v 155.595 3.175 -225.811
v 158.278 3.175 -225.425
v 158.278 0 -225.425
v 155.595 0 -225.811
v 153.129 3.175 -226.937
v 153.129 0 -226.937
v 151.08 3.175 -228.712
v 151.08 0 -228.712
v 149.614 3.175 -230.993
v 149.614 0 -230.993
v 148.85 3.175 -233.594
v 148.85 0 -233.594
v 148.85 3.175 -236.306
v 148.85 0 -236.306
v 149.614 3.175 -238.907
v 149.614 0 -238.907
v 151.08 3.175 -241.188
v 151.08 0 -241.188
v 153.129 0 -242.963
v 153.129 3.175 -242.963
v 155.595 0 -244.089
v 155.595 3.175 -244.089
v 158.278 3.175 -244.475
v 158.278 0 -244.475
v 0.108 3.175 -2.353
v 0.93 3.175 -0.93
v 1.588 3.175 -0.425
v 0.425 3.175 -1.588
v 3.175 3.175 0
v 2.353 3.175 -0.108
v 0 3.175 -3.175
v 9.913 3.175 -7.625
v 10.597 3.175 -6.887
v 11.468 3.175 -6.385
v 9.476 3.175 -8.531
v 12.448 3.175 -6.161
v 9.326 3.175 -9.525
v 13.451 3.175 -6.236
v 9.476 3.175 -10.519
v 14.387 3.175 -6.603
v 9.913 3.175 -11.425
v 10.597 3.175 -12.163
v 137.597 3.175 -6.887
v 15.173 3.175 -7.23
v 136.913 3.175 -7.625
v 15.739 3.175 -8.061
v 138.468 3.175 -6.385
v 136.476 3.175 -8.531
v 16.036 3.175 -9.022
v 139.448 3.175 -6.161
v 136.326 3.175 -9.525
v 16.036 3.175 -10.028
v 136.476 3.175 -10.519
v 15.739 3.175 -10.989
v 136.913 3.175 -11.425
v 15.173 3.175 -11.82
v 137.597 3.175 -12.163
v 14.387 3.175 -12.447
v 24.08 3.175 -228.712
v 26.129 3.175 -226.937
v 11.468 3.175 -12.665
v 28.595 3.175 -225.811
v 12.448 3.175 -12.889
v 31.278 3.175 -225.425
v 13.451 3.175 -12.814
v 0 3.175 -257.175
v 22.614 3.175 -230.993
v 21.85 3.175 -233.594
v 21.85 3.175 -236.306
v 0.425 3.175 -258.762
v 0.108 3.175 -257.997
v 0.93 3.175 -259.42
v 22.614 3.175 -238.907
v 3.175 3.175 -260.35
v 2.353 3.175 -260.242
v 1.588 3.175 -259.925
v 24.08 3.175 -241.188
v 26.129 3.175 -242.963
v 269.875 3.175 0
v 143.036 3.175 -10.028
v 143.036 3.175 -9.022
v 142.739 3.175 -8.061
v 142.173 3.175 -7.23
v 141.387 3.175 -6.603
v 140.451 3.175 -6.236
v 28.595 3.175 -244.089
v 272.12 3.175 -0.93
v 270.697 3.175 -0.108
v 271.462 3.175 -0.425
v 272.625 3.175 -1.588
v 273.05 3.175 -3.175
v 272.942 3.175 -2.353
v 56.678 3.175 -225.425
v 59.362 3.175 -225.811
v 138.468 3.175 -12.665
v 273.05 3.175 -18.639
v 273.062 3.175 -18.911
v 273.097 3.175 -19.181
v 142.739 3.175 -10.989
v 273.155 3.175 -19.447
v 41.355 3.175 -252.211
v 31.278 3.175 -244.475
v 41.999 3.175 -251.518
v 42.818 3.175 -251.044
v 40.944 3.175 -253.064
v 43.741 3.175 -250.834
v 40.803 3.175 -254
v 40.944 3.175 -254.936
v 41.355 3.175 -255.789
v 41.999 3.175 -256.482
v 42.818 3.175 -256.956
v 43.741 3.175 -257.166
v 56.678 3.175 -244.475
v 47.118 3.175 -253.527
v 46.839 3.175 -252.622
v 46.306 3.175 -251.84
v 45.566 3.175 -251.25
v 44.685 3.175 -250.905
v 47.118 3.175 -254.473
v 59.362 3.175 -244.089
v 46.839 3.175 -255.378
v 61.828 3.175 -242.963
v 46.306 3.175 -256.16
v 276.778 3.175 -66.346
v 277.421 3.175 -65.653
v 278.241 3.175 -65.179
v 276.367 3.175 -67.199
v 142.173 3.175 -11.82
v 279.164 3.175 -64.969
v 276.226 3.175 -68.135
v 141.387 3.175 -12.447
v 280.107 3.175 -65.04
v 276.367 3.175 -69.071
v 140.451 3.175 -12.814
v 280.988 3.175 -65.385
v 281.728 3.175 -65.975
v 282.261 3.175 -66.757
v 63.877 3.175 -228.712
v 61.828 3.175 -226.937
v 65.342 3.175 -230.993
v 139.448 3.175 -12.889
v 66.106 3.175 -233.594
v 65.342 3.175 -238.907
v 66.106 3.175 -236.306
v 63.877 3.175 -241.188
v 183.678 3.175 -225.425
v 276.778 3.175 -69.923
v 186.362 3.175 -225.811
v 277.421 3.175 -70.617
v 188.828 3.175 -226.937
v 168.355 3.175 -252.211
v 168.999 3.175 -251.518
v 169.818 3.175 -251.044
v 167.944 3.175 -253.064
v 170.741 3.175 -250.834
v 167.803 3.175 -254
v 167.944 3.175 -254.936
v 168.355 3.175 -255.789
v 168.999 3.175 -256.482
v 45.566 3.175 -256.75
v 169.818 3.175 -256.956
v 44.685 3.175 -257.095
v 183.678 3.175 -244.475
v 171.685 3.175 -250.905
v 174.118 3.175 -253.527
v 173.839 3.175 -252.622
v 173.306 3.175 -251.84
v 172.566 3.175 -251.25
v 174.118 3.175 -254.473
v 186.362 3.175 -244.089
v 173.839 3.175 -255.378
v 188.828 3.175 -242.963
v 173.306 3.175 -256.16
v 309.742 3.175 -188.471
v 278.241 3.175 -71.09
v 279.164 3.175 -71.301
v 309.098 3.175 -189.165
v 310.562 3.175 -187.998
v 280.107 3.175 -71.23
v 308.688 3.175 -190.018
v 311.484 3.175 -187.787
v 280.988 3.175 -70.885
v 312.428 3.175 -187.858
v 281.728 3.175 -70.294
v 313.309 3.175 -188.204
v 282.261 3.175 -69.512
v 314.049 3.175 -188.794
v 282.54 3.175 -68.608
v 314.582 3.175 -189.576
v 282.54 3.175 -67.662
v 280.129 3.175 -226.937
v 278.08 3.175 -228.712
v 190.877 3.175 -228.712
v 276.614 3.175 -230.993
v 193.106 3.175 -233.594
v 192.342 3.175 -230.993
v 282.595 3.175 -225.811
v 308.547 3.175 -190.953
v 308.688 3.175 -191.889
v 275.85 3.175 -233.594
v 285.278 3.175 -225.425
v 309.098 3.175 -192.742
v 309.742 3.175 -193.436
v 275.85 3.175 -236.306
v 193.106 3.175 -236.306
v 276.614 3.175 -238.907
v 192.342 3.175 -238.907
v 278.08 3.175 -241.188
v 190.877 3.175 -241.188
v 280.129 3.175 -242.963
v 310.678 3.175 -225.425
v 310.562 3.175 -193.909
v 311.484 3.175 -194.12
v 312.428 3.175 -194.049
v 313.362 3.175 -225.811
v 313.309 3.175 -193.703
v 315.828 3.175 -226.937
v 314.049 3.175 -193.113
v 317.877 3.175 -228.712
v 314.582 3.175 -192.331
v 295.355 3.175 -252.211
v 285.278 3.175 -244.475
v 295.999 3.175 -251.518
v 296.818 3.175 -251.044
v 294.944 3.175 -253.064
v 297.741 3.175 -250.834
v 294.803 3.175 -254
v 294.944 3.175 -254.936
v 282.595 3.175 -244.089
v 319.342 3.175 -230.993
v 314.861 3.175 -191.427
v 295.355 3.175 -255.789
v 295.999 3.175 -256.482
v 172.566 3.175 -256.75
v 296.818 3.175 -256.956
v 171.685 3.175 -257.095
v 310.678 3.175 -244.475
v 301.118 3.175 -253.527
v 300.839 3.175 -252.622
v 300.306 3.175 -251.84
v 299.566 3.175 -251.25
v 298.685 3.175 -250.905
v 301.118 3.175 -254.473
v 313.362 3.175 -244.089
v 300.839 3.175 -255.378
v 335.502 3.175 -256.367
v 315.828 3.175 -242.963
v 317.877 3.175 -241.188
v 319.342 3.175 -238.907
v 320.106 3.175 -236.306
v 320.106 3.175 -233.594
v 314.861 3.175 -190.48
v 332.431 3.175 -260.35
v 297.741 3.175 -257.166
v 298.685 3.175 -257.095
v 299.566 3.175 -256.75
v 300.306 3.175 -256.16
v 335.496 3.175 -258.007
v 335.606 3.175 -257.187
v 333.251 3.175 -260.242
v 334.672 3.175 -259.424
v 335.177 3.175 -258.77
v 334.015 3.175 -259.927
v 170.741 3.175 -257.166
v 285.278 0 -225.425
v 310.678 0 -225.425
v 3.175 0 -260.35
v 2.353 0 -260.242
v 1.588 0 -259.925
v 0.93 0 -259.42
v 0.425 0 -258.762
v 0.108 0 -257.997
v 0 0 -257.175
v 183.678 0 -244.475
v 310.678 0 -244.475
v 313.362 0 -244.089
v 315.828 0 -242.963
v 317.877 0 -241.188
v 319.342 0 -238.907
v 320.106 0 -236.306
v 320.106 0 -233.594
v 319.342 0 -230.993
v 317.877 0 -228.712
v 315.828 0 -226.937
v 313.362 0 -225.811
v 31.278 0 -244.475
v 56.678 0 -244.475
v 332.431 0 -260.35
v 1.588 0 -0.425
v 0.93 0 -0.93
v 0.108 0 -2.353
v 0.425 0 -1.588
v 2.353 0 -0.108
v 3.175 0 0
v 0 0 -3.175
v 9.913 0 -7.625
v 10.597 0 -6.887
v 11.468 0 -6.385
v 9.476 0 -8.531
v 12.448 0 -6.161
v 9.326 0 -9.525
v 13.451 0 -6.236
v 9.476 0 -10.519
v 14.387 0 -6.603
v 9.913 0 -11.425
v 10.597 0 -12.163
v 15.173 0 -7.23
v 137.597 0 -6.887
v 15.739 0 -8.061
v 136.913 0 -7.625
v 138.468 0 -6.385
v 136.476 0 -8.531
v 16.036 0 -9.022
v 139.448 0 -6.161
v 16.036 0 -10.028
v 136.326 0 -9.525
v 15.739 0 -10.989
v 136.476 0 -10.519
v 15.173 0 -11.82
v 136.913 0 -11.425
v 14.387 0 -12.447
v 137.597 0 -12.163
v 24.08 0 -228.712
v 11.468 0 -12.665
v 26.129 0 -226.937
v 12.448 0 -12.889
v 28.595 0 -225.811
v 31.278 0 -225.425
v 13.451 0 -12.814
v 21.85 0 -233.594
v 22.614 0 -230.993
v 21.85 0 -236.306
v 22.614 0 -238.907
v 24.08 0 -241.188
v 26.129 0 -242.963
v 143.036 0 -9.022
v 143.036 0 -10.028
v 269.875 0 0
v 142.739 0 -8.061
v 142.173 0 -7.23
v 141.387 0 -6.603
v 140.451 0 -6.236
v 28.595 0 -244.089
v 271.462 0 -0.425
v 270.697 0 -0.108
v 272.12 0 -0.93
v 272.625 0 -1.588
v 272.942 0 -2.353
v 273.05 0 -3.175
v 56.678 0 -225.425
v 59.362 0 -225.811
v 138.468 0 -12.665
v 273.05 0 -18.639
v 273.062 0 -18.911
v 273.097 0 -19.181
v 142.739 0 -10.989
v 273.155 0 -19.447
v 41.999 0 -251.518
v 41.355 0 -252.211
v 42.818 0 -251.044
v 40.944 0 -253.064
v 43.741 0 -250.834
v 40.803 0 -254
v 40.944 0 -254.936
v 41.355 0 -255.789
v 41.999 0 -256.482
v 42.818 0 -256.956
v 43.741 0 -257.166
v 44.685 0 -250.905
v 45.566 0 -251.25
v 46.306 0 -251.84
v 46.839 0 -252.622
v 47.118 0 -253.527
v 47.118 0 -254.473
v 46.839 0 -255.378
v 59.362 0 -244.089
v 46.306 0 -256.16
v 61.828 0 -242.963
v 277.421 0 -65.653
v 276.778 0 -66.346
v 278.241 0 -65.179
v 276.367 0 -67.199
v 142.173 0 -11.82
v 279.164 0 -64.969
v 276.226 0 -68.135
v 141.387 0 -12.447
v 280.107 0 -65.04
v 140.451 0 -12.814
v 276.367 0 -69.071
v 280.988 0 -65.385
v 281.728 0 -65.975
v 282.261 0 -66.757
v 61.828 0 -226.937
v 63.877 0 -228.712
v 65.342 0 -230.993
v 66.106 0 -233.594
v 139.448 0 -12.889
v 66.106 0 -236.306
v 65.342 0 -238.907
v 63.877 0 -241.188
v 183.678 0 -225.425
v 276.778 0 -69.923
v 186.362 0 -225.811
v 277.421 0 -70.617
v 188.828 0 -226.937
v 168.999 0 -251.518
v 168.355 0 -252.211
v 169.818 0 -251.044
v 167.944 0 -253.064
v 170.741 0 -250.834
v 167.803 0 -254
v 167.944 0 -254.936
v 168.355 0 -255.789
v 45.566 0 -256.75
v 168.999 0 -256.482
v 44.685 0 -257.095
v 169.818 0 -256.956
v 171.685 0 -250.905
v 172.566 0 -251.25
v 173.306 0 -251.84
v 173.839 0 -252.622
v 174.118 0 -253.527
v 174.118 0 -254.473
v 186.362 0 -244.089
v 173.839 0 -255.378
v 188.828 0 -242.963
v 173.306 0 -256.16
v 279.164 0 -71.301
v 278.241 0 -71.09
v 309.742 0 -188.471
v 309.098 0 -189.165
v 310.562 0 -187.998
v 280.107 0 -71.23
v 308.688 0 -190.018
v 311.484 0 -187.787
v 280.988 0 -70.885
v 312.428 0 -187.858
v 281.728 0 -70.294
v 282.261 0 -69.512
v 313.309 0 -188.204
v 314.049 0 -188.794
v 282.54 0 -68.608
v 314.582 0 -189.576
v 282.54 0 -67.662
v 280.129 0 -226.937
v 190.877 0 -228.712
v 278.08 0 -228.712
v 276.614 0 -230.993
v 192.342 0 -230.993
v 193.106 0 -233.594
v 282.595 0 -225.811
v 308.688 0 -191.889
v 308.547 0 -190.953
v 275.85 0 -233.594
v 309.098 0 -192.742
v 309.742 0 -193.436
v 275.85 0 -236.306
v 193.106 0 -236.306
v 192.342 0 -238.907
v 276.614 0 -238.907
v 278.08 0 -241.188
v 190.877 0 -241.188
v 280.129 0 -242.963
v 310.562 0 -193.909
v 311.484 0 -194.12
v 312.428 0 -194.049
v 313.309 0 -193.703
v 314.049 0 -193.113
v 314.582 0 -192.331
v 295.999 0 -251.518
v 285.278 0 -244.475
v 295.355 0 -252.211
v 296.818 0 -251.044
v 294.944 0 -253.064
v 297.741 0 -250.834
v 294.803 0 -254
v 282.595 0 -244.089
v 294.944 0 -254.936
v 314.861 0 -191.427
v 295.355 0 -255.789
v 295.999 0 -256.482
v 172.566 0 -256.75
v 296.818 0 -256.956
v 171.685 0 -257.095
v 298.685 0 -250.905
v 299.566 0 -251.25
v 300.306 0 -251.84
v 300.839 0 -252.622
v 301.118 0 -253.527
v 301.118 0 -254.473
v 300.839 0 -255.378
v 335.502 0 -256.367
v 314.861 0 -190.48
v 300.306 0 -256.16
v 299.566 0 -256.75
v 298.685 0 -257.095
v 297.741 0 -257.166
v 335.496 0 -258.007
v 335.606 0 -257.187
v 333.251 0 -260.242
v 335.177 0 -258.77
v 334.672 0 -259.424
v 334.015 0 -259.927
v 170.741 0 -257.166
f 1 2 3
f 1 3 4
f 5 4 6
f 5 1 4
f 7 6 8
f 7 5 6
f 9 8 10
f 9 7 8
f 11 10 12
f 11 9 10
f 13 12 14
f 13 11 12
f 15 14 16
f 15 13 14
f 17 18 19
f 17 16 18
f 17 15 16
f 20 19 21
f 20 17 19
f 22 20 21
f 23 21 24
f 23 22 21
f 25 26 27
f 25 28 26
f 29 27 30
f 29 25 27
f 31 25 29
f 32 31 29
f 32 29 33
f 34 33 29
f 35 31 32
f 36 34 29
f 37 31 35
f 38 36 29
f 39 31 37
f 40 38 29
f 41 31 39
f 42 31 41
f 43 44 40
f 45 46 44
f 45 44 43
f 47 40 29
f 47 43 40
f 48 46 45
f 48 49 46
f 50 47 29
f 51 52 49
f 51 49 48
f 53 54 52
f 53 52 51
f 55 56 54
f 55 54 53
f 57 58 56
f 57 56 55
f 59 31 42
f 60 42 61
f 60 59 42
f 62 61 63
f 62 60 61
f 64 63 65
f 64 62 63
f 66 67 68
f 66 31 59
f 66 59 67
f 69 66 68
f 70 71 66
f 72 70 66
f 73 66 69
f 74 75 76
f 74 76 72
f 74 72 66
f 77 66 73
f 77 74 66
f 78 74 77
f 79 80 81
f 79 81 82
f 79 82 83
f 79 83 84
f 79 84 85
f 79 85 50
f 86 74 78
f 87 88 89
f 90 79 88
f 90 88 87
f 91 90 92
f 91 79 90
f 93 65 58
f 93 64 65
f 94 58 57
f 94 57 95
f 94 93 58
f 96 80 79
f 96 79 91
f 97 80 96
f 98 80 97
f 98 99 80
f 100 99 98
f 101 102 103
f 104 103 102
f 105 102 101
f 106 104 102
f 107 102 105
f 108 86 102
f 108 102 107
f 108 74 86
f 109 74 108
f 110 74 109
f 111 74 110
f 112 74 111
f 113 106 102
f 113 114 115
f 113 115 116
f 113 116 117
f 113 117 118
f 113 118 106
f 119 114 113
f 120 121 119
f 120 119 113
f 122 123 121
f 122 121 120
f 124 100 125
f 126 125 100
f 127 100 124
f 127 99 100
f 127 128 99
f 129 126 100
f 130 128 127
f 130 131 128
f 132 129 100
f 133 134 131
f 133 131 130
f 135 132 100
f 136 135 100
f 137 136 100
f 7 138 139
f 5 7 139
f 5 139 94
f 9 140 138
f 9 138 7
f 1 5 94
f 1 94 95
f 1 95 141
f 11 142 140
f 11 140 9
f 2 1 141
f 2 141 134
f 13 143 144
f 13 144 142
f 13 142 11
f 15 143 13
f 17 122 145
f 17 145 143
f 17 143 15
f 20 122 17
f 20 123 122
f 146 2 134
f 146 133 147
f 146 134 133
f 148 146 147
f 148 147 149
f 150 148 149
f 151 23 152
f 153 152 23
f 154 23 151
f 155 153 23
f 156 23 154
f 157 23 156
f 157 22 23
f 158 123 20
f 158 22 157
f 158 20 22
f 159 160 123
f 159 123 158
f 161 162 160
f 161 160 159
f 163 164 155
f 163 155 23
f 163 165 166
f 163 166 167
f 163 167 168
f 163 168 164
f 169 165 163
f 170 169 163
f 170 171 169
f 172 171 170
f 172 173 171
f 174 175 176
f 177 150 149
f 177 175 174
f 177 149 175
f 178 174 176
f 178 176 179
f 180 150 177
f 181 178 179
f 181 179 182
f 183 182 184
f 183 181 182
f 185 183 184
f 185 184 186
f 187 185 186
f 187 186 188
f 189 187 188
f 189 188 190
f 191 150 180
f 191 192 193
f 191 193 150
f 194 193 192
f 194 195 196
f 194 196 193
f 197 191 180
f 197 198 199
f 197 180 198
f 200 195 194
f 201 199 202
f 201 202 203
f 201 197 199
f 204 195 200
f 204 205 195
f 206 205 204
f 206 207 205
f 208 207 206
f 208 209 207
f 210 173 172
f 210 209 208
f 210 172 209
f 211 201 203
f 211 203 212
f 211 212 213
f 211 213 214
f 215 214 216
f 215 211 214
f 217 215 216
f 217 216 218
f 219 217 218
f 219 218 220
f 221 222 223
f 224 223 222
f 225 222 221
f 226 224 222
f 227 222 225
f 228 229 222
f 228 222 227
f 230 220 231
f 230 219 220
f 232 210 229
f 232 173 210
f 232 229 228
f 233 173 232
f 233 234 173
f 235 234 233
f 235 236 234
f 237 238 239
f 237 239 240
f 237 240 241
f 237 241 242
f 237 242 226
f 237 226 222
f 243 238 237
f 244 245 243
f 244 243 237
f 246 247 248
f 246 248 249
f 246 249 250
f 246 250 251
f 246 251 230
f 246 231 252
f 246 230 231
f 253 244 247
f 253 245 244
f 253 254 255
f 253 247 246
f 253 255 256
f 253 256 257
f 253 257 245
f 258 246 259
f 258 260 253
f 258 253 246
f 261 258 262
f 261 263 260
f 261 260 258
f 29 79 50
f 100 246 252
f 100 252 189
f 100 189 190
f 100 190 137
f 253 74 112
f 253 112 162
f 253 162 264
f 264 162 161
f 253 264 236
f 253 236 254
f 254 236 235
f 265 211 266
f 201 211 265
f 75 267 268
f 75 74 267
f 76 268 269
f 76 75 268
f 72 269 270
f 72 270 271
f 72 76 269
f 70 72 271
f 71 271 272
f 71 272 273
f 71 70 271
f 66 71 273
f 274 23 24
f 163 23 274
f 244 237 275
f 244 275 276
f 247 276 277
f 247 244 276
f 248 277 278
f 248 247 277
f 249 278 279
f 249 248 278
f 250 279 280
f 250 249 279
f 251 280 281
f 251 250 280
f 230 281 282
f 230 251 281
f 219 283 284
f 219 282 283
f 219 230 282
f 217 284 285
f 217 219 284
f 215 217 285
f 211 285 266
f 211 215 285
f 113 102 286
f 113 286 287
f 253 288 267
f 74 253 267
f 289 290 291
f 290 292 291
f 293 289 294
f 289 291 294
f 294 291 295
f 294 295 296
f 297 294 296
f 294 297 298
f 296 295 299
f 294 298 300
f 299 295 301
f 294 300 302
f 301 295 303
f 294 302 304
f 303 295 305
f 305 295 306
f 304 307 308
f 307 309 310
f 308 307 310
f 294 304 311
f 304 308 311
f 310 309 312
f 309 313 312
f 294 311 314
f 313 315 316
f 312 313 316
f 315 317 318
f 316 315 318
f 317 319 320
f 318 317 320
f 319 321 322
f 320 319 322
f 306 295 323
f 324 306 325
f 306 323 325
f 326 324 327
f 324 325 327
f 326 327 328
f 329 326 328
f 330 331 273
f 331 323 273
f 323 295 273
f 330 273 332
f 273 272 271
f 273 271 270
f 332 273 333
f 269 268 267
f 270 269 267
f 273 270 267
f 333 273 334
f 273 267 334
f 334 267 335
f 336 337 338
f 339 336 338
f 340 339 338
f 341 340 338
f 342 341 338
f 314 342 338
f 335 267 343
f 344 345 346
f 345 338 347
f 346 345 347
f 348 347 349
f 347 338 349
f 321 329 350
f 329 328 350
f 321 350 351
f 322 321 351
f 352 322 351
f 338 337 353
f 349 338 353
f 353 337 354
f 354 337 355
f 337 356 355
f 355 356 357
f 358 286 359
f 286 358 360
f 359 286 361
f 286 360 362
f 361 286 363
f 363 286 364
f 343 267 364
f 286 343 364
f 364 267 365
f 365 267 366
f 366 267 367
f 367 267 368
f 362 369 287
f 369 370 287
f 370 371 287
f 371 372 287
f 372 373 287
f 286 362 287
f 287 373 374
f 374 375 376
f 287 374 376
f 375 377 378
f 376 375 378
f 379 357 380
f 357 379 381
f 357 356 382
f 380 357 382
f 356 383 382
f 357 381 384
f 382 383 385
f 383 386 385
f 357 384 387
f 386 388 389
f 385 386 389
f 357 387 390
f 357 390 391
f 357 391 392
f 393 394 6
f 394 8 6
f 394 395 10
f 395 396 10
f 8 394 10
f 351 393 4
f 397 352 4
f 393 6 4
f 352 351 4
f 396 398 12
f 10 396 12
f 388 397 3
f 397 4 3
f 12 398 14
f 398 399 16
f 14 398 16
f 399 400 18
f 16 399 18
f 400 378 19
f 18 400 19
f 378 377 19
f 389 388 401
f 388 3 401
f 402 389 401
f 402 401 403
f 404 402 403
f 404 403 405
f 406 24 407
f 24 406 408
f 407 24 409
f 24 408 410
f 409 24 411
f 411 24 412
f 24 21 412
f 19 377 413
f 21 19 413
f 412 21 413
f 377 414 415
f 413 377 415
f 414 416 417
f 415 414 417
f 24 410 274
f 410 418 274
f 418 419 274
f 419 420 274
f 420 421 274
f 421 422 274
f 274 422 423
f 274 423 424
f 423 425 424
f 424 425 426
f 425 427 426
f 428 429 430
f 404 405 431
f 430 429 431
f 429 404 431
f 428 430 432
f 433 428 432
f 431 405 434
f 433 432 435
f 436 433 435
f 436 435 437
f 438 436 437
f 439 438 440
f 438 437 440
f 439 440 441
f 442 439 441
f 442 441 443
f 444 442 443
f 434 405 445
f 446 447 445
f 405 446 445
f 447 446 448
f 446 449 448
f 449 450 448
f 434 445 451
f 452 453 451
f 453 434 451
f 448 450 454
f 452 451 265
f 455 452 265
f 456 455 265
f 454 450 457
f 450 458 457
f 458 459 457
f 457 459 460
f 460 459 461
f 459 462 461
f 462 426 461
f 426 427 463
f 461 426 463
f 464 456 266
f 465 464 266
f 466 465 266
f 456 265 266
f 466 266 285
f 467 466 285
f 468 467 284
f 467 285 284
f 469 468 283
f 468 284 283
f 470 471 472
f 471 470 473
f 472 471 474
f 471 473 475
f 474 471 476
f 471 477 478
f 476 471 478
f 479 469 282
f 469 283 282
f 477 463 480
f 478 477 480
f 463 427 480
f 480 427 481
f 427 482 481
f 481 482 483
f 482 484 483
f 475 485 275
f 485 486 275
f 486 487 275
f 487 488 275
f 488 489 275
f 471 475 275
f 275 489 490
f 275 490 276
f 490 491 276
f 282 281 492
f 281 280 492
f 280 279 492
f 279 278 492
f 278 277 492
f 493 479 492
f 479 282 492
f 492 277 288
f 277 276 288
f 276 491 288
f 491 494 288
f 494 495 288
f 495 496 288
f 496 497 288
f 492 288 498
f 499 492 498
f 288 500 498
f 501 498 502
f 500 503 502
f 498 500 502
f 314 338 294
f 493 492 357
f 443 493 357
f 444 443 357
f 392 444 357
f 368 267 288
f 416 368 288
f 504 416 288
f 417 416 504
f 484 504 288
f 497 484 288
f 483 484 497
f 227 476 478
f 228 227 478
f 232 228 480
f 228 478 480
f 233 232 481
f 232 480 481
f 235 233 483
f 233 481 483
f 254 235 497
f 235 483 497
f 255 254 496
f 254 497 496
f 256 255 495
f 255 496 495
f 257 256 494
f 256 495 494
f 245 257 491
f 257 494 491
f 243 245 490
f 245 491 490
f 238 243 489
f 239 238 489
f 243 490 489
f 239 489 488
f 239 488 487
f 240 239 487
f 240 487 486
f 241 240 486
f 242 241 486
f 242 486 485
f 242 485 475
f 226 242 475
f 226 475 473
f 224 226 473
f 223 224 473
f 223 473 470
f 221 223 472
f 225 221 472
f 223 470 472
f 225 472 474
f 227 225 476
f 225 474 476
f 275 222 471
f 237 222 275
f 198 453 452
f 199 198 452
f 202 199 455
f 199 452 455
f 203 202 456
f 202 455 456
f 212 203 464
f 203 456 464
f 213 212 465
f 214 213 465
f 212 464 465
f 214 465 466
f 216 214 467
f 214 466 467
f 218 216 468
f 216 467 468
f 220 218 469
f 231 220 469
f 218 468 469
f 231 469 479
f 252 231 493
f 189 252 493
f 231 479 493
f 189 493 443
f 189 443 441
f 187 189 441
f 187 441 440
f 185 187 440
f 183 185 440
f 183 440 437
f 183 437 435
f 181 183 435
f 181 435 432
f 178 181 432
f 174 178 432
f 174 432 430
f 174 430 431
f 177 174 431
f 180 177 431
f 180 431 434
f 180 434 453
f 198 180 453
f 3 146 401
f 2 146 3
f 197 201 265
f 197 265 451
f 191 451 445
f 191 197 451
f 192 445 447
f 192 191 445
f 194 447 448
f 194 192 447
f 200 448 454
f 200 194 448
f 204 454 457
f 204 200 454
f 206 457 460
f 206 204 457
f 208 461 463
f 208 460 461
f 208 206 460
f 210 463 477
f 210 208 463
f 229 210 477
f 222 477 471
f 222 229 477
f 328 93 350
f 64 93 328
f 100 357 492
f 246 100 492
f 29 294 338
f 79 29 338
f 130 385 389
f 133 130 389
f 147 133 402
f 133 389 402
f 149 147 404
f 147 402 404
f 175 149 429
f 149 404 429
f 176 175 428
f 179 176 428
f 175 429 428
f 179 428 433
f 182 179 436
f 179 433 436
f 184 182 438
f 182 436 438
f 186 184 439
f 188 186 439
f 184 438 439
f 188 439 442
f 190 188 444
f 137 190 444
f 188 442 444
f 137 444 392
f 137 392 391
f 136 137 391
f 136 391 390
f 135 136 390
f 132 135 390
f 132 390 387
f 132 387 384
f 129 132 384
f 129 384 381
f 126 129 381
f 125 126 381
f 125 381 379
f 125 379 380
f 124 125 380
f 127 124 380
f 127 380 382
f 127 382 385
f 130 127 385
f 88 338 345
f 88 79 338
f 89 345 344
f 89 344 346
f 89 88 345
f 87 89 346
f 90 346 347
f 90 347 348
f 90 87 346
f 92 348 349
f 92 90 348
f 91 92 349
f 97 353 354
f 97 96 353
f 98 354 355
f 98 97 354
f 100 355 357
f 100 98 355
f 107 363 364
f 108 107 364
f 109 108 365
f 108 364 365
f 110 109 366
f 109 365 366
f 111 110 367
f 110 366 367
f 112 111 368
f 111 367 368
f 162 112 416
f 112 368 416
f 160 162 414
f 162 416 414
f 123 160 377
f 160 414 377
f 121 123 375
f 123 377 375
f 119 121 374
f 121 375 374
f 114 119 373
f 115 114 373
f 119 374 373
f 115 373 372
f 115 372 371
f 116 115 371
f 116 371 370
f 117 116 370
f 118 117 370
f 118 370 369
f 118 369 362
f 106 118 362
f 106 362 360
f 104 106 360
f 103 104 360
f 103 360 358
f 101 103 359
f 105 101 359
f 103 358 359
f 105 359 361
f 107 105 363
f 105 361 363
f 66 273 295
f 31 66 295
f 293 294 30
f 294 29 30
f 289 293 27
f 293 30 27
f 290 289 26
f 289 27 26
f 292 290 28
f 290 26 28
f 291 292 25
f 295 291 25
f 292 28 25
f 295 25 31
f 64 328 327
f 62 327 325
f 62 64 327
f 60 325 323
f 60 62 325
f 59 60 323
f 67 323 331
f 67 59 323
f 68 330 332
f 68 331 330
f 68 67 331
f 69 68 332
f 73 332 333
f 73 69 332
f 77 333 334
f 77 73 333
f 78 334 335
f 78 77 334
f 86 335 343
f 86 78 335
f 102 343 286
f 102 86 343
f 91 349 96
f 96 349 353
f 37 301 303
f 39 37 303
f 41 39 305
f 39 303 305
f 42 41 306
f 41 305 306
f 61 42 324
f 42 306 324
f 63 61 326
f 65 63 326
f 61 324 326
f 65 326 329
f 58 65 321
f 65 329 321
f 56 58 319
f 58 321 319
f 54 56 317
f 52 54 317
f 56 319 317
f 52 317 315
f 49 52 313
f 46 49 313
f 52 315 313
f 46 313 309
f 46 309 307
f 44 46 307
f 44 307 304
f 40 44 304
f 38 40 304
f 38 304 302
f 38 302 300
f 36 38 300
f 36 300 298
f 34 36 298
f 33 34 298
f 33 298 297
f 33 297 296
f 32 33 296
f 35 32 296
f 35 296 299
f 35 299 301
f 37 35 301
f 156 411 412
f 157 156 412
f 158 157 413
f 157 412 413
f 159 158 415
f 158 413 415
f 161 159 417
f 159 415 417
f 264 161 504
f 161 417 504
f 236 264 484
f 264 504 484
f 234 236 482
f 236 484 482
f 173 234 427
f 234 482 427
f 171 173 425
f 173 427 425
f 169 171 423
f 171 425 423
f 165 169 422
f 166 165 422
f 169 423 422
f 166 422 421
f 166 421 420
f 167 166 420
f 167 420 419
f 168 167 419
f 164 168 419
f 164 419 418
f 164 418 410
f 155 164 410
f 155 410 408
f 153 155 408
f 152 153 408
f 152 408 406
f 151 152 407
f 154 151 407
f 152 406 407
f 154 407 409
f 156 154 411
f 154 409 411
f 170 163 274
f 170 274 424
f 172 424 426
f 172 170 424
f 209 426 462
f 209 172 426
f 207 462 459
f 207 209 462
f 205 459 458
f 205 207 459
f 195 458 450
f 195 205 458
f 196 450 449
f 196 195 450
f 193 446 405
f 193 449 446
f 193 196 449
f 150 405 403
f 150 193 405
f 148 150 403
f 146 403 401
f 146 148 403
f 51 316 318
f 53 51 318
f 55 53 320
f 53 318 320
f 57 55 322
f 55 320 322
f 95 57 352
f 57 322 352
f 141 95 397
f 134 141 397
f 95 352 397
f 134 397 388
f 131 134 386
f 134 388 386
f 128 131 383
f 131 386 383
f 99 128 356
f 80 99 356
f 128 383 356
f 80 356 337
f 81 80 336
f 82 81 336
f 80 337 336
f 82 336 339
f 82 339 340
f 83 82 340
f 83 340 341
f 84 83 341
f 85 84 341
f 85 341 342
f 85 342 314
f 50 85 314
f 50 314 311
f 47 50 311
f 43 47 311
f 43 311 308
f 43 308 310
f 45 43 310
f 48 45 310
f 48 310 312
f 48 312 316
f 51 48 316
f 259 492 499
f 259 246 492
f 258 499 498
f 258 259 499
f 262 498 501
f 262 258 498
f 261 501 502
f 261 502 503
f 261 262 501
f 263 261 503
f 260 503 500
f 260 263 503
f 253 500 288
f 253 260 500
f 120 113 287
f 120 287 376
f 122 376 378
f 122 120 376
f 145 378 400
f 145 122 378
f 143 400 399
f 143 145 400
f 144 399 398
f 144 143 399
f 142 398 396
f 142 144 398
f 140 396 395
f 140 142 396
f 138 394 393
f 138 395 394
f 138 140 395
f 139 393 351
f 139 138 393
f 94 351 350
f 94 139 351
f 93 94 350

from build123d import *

# Parameters (mm, degrees)
BOSS_EXTRUDE1_DEPTH              = 3.175
FILLET1_R                        = 3.175
F_1_4_0_25_DIAMETER_HOLE1_D      = 6.35
F_17_64_0_26563_DIAMETER_HOLE1_D = 6.747002
SKETCH9_R                        = 3.175
CUT_EXTRUDE1_DEPTH               = 425.763278612


with BuildPart() as part:
    # Sketch1 → Boss-Extrude1 (new body)
    with BuildSketch(Plane(origin=(0, 0, 0), x_dir=(1, 0, 0), z_dir=(0, 1, 0))):
        Polygon((0, 0), (273.05, 0), (273.05, 19.05), (336.55, 260.35), (0, 260.35), align=None)
    extrude(amount=BOSS_EXTRUDE1_DEPTH)

    # Fillet1
    fillet1_edges = [part.edges().sort_by_distance(p)[0] for p in [
        (0, 1.5875, -260.35),
        (336.55, 1.5875, -260.35),
        (273.05, 1.5875, -19.05),
        (273.05, 1.5875, 0),
        (0, 1.5875, 0),
    ]]
    fillet(fillet1_edges, radius=FILLET1_R)

    # 1/4 (0.25) Diameter Hole1 (through all)
    with Locations(Plane(origin=(0, 3.175, 0), x_dir=(1, 0, 0), z_dir=(0, 1, 0))):
        with Locations((43.97818809, 254), (170.97818809, 254), (297.97818809, 254), (311.721536551, 190.953379927), (279.400887542, 68.134913694)):
            Hole(F_1_4_0_25_DIAMETER_HOLE1_D / 2)

    # 17/64 (0.26563) Diameter Hole1 (through all)
    with Locations(Plane(origin=(0, 3.175, 0), x_dir=(1, 0, 0), z_dir=(0, 1, 0))):
        with Locations((12.7, 9.525), (139.7, 9.525)):
            Hole(F_17_64_0_26563_DIAMETER_HOLE1_D / 2)

    # Sketch9 → Cut-Extrude1 (cut, through all)
    with BuildSketch(Plane(origin=(0, 3.175, 0), x_dir=(1, 0, 0), z_dir=(0, 1, 0))):
        with Locations(Location((297.97818809, 254, 0), (0, 0, 270))):
            Circle(SKETCH9_R)
        with Locations(Location((170.97818809, 254, 0), (0, 0, 270))):
            Circle(SKETCH9_R)
        with Locations(Location((43.97818809, 254, 0), (0, 0, 270))):
            Circle(SKETCH9_R)
        with BuildLine():
            Line((31.27818809, 244.475), (56.67818809, 244.475))
            ThreePointArc((56.67818809, 244.475), (66.20318809, 234.95), (56.67818809, 225.425))
            Line((56.67818809, 225.425), (31.27818809, 225.425))
            ThreePointArc((31.27818809, 225.425), (21.75318809, 234.95), (31.27818809, 244.475))
        make_face()
        with BuildLine():
            Line((158.27818809, 244.475), (183.67818809, 244.475))
            ThreePointArc((183.67818809, 244.475), (193.20318809, 234.95), (183.67818809, 225.425))
            Line((183.67818809, 225.425), (158.27818809, 225.425))
            ThreePointArc((158.27818809, 225.425), (148.75318809, 234.95), (158.27818809, 244.475))
        make_face()
        with BuildLine():
            Line((285.27818809, 244.475), (310.67818809, 244.475))
            ThreePointArc((310.67818809, 244.475), (320.20318809, 234.95), (310.67818809, 225.425))
            Line((310.67818809, 225.425), (285.27818809, 225.425))
            ThreePointArc((285.27818809, 225.425), (275.75318809, 234.95), (285.27818809, 244.475))
        make_face()
    extrude(amount=-CUT_EXTRUDE1_DEPTH, mode=Mode.SUBTRACT)


solid = part.part
